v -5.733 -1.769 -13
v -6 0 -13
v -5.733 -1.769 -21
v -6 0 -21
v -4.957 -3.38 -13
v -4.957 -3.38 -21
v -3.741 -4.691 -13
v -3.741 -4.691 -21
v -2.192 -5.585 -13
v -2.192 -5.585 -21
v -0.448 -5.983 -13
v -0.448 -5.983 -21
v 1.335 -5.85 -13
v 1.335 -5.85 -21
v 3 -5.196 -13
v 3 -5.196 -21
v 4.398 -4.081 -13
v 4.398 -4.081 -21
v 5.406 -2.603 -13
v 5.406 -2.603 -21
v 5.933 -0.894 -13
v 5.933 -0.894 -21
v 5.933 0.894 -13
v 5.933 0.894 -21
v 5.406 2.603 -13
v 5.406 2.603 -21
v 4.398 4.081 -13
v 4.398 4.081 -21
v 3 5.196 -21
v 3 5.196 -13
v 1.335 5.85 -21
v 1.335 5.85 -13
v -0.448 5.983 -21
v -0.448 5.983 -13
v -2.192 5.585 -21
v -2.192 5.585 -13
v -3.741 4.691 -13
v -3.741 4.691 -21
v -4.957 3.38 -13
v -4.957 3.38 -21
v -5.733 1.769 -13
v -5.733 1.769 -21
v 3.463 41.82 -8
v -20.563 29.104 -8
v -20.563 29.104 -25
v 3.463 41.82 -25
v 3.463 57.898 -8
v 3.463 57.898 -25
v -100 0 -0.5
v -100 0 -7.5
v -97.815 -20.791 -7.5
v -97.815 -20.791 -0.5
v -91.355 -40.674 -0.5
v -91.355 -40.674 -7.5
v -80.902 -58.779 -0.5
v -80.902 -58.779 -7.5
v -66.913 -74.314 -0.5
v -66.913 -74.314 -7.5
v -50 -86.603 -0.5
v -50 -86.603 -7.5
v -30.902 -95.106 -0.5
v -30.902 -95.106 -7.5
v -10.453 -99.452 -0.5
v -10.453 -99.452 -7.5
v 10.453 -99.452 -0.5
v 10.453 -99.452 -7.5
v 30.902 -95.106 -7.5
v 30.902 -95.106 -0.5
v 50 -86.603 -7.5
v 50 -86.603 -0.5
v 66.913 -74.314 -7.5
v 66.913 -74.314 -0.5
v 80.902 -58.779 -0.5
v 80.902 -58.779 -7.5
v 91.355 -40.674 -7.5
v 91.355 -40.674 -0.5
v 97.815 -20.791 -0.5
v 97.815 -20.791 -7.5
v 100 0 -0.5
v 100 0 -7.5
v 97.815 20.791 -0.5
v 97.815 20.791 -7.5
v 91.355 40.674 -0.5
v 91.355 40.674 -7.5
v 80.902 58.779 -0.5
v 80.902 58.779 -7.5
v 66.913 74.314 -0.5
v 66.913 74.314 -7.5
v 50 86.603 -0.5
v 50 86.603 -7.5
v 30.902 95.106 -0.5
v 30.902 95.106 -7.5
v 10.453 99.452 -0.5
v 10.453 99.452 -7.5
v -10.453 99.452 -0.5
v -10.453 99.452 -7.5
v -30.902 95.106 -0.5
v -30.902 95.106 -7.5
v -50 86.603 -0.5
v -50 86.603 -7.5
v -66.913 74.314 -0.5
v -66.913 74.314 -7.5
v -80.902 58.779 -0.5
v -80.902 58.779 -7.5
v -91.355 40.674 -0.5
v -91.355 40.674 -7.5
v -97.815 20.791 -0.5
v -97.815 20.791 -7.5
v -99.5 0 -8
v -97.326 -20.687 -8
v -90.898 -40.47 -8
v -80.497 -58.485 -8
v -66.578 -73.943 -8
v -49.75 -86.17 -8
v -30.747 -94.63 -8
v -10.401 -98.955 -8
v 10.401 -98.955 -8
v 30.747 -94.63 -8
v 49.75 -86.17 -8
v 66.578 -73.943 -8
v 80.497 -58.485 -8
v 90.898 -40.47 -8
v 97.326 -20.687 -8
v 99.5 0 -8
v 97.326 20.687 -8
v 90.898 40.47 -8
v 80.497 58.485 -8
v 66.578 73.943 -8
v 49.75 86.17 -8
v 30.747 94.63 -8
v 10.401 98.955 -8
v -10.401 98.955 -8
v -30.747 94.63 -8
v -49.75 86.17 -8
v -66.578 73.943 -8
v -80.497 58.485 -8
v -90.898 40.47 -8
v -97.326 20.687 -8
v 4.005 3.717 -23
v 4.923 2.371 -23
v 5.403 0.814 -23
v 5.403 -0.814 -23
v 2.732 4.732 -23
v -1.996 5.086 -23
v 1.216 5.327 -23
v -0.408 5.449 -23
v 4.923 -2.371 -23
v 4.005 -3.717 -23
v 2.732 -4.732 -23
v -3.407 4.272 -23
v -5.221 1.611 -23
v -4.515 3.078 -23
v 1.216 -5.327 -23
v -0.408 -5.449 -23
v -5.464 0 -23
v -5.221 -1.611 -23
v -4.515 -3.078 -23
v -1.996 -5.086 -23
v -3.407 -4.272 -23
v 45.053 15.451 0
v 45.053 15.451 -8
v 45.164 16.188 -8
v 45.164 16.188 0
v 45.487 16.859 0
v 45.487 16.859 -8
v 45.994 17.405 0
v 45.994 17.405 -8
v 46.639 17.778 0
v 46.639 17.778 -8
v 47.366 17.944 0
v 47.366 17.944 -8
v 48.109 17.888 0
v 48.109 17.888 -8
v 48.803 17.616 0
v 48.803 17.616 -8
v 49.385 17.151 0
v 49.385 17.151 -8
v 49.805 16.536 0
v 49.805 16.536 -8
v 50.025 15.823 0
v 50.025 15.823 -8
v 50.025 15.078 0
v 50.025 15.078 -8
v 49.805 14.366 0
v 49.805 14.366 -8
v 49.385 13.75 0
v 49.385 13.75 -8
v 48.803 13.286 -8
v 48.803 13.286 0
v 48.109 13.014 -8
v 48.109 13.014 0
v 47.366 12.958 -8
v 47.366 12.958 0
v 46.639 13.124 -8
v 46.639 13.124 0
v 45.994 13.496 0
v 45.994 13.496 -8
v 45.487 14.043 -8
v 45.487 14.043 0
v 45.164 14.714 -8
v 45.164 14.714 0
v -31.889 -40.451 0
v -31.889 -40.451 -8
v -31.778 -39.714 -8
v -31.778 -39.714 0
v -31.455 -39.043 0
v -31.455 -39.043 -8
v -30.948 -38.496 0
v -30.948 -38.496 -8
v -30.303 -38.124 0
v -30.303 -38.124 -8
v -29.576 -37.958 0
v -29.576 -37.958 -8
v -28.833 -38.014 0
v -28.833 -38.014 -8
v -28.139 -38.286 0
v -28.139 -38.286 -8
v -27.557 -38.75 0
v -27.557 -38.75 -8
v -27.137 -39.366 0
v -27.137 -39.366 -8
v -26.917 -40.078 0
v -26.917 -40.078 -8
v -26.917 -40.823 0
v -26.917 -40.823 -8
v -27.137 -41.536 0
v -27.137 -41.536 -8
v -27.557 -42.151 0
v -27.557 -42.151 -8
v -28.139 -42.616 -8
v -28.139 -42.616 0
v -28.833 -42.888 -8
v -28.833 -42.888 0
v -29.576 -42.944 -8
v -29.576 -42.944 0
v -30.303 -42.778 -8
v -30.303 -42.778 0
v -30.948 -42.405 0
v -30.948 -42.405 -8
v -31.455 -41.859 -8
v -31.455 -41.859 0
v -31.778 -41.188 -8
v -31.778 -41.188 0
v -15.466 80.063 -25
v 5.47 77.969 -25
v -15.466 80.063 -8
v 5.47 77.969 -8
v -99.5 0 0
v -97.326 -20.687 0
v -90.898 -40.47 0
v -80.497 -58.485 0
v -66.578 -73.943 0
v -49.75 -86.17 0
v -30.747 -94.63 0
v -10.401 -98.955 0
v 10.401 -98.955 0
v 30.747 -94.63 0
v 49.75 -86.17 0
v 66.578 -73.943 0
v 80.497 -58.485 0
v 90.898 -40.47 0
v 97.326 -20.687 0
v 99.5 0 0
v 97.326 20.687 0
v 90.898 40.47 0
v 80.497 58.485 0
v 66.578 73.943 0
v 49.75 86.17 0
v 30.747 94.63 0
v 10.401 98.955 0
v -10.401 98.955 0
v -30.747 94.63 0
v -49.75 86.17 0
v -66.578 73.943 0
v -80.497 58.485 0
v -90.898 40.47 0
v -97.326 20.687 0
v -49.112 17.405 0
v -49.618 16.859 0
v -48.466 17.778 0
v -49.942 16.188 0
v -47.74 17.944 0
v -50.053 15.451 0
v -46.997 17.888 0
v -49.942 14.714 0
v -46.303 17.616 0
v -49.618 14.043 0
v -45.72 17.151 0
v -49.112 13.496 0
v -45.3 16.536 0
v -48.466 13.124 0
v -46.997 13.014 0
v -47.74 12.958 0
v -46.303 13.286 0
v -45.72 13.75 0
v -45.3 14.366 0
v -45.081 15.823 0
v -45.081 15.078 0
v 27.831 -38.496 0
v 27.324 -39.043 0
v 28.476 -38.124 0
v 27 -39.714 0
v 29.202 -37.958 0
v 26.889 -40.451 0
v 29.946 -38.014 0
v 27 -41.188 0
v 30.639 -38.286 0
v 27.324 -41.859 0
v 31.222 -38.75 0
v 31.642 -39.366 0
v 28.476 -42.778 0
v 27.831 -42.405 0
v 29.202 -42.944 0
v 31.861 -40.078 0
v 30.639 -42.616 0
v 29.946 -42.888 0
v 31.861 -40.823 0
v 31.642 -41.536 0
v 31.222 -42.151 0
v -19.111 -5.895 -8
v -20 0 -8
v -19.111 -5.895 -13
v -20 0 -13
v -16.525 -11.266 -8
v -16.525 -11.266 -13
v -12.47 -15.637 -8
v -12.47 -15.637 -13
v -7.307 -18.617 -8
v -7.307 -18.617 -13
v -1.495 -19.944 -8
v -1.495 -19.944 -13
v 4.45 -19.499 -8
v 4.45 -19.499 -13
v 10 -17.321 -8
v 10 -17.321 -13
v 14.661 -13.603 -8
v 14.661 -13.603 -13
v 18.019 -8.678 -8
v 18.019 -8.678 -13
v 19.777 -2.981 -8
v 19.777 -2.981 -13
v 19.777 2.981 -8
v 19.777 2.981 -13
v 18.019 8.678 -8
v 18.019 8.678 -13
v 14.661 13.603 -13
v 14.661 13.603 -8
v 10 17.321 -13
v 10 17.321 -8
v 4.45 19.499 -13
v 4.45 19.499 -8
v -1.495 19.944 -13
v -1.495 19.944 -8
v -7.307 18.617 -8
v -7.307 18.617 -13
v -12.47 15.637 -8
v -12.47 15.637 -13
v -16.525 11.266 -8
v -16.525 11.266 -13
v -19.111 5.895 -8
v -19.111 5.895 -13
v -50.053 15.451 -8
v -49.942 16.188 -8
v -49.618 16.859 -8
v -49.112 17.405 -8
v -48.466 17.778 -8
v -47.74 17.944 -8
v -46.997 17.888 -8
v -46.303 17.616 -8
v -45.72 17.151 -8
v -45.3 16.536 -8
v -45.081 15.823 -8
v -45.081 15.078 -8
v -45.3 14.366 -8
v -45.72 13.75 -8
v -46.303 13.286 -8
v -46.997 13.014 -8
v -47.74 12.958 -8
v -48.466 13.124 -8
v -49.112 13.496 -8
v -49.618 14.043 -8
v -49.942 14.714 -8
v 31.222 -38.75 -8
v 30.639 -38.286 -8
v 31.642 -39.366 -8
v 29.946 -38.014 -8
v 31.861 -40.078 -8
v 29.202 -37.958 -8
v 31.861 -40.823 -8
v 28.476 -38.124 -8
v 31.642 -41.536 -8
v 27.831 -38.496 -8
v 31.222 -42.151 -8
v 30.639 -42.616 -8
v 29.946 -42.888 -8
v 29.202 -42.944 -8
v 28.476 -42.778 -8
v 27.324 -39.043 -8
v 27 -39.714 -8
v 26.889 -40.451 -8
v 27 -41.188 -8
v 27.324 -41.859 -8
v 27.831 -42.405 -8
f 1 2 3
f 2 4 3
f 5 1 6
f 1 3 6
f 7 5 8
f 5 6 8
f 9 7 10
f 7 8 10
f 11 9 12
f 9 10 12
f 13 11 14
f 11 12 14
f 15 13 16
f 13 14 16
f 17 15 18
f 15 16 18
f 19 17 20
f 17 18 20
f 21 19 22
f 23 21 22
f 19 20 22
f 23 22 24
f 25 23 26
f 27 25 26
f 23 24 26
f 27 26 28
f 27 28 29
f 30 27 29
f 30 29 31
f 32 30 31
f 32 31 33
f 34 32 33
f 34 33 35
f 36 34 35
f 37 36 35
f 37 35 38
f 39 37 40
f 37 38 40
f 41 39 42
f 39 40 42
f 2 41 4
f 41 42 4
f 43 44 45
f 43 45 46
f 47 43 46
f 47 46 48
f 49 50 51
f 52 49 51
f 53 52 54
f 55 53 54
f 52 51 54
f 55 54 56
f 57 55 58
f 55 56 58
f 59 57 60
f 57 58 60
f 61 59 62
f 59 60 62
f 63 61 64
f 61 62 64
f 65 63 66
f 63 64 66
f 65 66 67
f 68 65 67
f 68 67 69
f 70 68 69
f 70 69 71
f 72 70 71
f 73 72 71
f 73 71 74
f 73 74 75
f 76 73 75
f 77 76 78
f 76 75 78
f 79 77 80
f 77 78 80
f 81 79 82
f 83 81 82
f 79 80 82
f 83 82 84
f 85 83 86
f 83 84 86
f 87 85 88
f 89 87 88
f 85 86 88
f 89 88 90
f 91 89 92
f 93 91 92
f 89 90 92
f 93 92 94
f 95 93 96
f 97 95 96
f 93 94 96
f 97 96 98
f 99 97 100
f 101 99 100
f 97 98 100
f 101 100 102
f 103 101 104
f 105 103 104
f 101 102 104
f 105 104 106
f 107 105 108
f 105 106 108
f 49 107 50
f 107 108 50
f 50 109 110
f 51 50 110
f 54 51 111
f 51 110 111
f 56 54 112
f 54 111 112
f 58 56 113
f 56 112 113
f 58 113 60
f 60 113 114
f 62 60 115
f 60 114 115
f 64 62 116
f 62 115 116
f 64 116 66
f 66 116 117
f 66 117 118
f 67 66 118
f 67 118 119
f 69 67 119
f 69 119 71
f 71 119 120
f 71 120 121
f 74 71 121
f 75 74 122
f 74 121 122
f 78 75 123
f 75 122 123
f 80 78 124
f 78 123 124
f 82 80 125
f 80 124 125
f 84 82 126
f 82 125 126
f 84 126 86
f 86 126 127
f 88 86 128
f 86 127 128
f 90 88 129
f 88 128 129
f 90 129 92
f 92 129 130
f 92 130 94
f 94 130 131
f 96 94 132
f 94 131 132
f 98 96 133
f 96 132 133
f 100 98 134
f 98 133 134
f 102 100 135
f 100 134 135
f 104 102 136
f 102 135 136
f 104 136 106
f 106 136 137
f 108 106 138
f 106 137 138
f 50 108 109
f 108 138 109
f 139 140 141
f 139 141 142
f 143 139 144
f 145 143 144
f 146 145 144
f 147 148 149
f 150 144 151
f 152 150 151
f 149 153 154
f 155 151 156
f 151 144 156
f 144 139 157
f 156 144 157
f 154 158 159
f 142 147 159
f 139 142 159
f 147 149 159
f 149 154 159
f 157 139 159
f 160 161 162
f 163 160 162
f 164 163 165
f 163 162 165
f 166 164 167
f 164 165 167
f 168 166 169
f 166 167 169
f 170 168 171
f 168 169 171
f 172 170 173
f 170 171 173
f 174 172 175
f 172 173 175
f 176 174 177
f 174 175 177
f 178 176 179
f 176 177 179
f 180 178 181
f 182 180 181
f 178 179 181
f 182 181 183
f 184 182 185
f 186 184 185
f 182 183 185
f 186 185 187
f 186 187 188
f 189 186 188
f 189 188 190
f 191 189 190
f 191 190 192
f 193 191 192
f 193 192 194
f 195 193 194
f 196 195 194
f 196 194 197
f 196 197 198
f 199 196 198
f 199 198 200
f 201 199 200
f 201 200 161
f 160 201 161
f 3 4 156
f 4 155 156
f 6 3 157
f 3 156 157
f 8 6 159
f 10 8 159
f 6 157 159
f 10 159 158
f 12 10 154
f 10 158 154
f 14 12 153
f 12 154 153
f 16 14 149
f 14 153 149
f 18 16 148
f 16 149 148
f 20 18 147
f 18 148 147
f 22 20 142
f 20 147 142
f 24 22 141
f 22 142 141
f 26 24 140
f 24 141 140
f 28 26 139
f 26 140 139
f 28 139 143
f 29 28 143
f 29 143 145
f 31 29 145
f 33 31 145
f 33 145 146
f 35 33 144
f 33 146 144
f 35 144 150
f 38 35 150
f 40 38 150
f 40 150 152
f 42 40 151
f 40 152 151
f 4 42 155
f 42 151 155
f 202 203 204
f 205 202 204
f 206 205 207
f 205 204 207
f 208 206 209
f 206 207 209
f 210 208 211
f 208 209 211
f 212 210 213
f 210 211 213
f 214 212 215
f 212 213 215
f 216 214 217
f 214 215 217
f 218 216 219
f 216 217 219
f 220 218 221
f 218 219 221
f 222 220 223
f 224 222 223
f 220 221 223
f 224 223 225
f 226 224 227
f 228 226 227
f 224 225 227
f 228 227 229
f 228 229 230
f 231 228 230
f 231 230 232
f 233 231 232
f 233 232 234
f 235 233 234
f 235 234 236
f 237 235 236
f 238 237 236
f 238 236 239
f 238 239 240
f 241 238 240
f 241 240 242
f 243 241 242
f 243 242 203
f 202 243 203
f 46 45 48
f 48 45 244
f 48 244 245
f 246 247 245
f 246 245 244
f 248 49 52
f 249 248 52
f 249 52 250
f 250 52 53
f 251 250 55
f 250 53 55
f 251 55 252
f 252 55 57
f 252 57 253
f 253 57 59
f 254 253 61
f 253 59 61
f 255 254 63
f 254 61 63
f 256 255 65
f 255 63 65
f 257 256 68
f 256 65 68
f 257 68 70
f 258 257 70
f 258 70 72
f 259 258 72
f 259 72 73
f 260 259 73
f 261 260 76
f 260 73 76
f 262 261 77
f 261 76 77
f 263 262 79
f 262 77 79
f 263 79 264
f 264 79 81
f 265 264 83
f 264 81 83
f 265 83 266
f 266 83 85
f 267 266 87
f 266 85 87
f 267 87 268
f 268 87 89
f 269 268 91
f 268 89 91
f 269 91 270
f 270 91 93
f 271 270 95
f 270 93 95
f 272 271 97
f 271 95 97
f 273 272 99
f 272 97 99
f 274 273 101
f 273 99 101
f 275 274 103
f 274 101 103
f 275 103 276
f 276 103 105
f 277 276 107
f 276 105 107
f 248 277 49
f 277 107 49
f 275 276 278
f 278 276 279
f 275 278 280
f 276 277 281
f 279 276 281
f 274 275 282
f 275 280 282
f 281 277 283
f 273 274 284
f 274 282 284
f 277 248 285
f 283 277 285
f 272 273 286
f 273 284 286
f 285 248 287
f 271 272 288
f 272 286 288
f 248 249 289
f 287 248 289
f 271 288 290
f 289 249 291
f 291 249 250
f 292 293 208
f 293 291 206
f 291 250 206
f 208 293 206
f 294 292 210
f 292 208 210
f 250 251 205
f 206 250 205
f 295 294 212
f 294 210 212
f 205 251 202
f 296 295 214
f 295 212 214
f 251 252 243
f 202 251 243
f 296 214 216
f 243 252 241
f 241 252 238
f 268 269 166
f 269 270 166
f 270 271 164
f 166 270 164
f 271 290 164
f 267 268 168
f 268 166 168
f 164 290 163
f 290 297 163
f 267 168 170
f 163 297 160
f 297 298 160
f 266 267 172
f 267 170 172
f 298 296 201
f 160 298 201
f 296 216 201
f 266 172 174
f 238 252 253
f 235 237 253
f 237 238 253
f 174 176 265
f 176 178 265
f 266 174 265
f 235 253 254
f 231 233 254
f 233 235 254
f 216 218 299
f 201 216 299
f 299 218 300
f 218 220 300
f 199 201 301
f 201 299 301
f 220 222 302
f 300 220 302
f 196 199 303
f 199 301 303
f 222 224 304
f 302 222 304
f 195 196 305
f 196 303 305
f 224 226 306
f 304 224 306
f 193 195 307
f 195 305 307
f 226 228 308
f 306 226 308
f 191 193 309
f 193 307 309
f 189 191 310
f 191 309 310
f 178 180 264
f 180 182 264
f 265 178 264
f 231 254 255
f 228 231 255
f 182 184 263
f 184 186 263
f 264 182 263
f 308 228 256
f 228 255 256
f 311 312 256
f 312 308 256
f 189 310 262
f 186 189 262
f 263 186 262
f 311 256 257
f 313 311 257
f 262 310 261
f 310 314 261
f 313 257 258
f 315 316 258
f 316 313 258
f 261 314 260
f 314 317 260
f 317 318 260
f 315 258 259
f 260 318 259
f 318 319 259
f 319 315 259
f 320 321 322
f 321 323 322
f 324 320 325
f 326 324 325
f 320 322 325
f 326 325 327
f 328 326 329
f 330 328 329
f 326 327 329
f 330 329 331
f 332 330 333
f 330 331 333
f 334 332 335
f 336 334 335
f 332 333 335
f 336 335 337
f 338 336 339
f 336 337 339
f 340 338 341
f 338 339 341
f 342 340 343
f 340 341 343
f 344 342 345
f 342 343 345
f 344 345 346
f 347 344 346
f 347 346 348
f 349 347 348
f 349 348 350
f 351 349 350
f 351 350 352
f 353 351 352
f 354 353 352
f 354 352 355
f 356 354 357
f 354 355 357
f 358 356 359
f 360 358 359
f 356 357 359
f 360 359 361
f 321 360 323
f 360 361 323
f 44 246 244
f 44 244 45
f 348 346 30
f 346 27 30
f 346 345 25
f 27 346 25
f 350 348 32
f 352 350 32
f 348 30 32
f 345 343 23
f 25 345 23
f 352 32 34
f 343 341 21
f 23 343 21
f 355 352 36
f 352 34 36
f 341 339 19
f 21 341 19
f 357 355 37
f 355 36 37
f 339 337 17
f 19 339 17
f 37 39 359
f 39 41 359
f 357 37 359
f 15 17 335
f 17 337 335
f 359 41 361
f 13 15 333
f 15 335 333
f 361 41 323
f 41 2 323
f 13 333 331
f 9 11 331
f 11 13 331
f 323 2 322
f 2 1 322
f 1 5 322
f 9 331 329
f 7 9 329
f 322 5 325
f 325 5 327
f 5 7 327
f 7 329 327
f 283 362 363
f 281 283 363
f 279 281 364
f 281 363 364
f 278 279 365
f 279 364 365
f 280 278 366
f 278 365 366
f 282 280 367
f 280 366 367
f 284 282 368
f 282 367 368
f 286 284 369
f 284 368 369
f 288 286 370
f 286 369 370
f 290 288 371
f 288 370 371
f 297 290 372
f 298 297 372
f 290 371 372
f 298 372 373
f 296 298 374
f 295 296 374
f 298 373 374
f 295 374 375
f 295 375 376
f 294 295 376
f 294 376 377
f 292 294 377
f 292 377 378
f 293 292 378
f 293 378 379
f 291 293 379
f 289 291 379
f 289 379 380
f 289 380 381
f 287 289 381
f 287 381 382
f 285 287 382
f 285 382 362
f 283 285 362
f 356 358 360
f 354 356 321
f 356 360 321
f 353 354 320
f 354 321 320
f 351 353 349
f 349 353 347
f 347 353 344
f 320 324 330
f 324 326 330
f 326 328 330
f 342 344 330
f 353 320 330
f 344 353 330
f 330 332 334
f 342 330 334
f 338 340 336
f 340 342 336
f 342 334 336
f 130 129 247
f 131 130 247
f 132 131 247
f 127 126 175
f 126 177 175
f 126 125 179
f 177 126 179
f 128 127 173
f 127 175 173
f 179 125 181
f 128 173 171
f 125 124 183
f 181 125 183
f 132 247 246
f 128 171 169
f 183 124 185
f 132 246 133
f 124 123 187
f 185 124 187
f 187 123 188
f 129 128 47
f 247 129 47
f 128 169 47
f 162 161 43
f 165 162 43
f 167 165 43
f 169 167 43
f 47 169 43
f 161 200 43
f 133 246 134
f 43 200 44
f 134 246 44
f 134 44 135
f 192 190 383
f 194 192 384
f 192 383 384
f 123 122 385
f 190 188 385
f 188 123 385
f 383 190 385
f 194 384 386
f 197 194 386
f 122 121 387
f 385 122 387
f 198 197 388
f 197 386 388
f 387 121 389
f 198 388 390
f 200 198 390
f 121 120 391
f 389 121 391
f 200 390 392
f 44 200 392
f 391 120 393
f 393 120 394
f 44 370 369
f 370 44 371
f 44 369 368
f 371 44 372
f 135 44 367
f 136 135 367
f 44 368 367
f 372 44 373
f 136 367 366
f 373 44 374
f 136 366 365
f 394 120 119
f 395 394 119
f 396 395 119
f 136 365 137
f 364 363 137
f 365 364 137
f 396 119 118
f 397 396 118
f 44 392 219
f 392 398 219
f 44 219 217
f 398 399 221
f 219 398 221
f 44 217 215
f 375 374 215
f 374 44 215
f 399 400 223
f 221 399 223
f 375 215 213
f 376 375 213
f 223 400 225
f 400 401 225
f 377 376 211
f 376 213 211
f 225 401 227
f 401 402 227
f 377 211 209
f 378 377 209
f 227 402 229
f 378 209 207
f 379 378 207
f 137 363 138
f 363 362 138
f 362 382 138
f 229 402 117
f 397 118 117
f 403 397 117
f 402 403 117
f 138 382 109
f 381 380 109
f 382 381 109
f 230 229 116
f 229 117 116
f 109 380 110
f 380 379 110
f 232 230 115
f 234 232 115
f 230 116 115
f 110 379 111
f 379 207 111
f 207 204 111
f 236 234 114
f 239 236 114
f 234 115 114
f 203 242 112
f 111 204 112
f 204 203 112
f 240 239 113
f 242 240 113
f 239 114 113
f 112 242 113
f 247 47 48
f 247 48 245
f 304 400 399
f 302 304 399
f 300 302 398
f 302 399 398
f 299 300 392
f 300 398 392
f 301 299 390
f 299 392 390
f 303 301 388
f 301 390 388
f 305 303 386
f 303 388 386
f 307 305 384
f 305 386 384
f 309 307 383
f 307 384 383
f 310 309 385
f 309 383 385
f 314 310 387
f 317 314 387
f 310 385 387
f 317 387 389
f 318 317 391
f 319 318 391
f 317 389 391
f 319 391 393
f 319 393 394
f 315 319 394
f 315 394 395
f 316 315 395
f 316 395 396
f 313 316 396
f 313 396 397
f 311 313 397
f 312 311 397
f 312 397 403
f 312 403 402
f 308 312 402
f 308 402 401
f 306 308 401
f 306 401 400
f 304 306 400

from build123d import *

# Parameters (mm, degrees)
F4_SIZE  = 0.5
F6_D     = 5
F8_DEPTH = 25


with BuildPart() as f1:
    # F0 (on Front) → F1 (revolve)
    with BuildSketch(Plane.XZ):
        Polygon((0, -8), (0, 0), (-100, 0), (-100, -8), (-20, -8), align=None)
    revolve(axis=Axis((0, 0, -4), (0, 0, 1)))

    # F4
    f4_edges = [f1.edges().sort_by_distance(p)[0] for p in [
        (100, 0, 0),
        (100, 0, -8),
    ]]
    chamfer(f4_edges, length=F4_SIZE)

    # F6 (through all)
    with Locations(Plane.XY):
        with Locations((0, 50), (-47.552826, 15.45085), (-29.389263, -40.45085), (29.389263, -40.45085), (47.552826, 15.45085)):
            Hole(F6_D / 2)

    # F7 (on Top) → F8 (join)
    with BuildSketch(Plane.XY):
        Polygon((-15.466388, 80.062874), (-20.562582, 29.104382), (3.462564, 41.819647), (3.462564, 57.898351), (5.469776, 77.969116), align=None)
    extrude(amount=-F8_DEPTH)


with BuildPart() as f2:
    # F0 (on Front) → F2 (revolve)
    with BuildSketch(Plane.XZ):
        Polygon((0, -23), (0, -8), (-20, -8), (-20, -13), (-9.08917, -13), (-6, -13), (-6, -21), (-5.464102, -23), align=None)
    revolve(axis=Axis((0, 0, -4), (0, 0, 1)))


solid = Compound([f1.part, f2.part])
